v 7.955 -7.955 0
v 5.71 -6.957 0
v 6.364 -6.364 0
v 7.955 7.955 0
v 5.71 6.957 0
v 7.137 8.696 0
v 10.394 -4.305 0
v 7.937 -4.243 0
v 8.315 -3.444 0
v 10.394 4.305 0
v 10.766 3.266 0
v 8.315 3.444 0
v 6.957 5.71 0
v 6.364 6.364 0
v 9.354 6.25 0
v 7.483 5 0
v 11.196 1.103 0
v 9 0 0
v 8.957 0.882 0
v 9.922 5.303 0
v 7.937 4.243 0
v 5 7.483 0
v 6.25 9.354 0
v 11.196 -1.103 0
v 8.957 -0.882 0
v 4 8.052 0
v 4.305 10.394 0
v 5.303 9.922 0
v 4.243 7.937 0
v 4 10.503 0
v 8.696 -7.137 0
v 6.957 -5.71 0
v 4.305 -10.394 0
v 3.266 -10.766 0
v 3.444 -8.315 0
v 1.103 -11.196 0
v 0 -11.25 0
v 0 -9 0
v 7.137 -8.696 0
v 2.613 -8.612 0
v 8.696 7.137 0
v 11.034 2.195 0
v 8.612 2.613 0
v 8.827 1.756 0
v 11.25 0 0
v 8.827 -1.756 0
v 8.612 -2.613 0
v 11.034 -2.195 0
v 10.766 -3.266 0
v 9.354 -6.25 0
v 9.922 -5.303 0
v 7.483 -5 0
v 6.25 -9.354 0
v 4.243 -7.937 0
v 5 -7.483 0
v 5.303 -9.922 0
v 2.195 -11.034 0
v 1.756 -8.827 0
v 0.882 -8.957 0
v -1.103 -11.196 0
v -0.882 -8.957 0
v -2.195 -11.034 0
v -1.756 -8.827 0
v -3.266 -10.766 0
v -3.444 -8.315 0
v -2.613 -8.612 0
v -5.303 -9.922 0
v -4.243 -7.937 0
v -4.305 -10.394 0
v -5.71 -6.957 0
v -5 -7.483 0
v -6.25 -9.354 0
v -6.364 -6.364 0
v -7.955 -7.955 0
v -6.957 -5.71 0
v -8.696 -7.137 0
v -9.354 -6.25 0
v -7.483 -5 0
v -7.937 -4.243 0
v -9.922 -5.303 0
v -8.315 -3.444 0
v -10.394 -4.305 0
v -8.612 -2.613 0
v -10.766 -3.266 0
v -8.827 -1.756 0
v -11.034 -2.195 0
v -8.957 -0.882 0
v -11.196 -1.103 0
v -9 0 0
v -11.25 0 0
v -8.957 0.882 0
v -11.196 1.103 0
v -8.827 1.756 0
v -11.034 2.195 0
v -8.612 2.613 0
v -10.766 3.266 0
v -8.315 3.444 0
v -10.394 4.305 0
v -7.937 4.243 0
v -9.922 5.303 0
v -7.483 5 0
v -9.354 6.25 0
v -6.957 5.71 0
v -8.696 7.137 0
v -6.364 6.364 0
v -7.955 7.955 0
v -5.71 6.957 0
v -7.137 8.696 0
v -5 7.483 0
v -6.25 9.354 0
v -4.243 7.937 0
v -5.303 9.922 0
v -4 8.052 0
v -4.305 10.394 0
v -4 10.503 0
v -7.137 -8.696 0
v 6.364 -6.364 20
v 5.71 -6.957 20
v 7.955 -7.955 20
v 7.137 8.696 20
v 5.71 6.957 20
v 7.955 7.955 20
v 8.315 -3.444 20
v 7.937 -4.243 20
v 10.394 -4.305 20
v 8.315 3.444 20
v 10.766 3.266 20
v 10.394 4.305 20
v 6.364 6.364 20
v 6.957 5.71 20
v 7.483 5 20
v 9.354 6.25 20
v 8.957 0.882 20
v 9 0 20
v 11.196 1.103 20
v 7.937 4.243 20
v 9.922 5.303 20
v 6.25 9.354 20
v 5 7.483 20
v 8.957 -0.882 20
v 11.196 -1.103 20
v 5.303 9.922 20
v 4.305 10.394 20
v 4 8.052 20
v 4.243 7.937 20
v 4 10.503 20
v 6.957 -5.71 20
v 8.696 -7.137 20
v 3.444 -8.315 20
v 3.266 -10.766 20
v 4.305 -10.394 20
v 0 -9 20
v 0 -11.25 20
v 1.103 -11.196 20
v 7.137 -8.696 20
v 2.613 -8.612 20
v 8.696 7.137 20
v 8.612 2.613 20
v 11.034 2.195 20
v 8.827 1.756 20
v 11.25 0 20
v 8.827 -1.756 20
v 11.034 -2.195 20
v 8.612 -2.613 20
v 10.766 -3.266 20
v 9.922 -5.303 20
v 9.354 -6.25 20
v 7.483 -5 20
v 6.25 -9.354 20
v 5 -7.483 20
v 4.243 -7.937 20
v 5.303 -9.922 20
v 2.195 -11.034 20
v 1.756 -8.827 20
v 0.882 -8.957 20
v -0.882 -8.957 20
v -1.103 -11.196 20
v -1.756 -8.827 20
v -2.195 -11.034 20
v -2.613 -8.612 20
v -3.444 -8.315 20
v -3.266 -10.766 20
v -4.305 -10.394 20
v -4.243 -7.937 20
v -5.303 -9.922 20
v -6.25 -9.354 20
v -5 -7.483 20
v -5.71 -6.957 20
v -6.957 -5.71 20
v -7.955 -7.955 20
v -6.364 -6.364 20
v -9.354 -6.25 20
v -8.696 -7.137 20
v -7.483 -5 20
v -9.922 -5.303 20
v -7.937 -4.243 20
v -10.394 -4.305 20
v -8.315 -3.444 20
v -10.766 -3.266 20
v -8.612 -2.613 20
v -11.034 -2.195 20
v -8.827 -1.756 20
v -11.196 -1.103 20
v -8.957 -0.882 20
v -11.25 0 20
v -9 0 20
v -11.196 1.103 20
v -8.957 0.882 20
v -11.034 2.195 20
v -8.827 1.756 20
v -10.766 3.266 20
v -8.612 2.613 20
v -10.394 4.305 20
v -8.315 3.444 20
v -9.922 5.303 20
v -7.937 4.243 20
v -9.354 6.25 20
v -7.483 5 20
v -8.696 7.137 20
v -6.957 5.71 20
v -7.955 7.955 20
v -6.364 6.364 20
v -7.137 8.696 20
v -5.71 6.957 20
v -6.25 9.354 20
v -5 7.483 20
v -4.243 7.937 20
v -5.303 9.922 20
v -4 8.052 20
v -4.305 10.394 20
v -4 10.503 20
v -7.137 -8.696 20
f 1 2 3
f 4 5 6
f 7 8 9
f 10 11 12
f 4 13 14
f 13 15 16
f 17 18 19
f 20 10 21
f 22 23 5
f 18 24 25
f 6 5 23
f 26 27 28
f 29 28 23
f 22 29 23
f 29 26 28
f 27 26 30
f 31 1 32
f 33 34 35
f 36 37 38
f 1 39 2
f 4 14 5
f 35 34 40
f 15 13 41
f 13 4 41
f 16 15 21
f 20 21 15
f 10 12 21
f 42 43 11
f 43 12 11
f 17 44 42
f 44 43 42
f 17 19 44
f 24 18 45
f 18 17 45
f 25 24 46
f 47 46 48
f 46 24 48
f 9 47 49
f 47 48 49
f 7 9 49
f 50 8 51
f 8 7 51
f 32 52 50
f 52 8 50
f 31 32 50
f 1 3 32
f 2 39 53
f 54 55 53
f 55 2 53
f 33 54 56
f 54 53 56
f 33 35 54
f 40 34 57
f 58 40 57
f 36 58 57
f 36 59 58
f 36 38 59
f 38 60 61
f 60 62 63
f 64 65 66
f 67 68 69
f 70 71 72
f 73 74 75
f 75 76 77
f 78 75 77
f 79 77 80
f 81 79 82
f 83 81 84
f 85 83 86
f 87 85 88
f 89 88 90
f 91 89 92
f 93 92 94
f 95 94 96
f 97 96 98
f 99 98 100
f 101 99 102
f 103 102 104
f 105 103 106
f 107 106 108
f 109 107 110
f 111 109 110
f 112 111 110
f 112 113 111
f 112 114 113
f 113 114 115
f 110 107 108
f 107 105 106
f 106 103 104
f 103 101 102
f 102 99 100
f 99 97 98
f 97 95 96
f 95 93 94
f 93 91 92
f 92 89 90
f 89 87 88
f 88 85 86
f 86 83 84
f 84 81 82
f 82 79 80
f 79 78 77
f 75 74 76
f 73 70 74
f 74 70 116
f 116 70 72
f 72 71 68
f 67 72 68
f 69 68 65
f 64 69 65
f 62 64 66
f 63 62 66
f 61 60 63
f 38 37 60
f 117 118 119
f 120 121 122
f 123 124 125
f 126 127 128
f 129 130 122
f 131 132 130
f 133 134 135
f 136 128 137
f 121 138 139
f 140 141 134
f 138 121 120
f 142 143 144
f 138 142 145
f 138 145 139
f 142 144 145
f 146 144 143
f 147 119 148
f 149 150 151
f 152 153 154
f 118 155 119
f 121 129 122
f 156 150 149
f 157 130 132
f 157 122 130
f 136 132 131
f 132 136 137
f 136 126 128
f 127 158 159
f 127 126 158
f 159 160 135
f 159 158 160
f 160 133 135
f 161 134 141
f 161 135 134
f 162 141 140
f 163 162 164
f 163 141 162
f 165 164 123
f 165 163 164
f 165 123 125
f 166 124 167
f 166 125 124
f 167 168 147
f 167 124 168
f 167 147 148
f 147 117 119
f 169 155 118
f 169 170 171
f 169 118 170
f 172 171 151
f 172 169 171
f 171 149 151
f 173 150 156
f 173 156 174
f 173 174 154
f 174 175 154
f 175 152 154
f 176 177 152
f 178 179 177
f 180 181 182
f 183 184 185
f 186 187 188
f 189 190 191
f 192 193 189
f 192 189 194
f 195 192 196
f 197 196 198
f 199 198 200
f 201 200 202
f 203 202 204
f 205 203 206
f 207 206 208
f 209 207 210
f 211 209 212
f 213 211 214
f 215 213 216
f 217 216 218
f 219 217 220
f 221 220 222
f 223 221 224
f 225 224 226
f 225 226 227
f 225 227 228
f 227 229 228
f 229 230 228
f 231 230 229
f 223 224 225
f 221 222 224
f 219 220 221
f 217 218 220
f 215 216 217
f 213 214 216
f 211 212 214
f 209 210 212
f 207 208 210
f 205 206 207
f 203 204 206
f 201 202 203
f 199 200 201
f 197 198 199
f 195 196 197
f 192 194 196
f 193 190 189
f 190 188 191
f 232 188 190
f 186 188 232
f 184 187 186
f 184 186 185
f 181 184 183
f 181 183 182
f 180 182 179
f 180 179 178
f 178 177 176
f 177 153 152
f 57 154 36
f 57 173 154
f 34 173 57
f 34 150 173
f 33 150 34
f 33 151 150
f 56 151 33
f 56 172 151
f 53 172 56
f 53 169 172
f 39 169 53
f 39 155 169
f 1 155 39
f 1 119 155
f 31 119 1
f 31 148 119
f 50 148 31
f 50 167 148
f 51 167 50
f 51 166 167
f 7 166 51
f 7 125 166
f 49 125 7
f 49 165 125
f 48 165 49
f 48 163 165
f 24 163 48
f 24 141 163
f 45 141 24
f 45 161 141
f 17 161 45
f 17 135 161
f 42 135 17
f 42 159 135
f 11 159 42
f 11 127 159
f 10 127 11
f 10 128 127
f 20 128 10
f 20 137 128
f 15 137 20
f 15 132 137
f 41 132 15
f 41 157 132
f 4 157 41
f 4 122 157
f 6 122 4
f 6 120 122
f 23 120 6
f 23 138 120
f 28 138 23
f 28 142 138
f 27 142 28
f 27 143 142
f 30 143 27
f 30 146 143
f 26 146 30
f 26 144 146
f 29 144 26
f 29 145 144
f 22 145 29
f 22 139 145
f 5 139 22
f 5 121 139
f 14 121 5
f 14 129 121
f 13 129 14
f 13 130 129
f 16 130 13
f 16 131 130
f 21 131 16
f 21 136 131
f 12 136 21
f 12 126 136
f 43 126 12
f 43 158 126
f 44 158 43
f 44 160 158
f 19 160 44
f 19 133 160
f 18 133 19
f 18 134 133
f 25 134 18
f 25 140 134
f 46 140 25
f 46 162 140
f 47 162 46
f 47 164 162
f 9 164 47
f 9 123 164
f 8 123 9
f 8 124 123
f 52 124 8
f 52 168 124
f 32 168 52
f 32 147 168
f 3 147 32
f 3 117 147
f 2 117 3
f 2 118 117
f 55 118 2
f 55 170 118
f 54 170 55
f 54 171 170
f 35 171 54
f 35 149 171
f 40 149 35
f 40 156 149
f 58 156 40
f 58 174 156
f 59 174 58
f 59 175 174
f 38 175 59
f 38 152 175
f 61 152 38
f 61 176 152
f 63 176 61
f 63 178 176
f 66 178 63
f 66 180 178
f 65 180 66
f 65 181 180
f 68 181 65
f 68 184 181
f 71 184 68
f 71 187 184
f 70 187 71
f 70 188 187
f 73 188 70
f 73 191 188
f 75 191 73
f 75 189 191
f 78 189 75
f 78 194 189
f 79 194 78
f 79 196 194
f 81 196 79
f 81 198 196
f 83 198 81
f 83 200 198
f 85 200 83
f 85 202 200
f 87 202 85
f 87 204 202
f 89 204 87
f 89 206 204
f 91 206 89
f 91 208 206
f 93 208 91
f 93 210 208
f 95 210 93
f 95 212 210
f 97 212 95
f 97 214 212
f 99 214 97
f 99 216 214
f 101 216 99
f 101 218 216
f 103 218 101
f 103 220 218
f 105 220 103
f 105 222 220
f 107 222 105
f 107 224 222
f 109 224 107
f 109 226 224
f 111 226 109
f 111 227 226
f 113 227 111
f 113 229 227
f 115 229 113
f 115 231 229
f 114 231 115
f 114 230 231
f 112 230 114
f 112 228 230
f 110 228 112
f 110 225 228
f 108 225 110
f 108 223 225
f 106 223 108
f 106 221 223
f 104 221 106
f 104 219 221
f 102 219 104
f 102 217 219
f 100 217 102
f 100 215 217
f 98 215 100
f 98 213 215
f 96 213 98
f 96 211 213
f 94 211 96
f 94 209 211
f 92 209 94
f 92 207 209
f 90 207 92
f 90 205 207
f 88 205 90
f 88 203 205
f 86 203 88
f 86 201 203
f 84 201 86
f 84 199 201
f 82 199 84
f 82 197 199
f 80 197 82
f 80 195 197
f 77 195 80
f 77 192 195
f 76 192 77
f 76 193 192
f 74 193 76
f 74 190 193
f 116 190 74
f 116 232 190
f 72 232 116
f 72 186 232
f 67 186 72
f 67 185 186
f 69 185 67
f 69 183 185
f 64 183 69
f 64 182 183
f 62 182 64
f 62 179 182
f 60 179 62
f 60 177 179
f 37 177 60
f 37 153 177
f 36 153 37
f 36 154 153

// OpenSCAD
echo($fn);
$fn = $preview ? 8 : 64;
linear_extrude(20) {
    difference() {
        circle(d=22.5);
        circle(d=18);
        translate([-4,0]) {
            square([8,15]);
        }
    }
}
